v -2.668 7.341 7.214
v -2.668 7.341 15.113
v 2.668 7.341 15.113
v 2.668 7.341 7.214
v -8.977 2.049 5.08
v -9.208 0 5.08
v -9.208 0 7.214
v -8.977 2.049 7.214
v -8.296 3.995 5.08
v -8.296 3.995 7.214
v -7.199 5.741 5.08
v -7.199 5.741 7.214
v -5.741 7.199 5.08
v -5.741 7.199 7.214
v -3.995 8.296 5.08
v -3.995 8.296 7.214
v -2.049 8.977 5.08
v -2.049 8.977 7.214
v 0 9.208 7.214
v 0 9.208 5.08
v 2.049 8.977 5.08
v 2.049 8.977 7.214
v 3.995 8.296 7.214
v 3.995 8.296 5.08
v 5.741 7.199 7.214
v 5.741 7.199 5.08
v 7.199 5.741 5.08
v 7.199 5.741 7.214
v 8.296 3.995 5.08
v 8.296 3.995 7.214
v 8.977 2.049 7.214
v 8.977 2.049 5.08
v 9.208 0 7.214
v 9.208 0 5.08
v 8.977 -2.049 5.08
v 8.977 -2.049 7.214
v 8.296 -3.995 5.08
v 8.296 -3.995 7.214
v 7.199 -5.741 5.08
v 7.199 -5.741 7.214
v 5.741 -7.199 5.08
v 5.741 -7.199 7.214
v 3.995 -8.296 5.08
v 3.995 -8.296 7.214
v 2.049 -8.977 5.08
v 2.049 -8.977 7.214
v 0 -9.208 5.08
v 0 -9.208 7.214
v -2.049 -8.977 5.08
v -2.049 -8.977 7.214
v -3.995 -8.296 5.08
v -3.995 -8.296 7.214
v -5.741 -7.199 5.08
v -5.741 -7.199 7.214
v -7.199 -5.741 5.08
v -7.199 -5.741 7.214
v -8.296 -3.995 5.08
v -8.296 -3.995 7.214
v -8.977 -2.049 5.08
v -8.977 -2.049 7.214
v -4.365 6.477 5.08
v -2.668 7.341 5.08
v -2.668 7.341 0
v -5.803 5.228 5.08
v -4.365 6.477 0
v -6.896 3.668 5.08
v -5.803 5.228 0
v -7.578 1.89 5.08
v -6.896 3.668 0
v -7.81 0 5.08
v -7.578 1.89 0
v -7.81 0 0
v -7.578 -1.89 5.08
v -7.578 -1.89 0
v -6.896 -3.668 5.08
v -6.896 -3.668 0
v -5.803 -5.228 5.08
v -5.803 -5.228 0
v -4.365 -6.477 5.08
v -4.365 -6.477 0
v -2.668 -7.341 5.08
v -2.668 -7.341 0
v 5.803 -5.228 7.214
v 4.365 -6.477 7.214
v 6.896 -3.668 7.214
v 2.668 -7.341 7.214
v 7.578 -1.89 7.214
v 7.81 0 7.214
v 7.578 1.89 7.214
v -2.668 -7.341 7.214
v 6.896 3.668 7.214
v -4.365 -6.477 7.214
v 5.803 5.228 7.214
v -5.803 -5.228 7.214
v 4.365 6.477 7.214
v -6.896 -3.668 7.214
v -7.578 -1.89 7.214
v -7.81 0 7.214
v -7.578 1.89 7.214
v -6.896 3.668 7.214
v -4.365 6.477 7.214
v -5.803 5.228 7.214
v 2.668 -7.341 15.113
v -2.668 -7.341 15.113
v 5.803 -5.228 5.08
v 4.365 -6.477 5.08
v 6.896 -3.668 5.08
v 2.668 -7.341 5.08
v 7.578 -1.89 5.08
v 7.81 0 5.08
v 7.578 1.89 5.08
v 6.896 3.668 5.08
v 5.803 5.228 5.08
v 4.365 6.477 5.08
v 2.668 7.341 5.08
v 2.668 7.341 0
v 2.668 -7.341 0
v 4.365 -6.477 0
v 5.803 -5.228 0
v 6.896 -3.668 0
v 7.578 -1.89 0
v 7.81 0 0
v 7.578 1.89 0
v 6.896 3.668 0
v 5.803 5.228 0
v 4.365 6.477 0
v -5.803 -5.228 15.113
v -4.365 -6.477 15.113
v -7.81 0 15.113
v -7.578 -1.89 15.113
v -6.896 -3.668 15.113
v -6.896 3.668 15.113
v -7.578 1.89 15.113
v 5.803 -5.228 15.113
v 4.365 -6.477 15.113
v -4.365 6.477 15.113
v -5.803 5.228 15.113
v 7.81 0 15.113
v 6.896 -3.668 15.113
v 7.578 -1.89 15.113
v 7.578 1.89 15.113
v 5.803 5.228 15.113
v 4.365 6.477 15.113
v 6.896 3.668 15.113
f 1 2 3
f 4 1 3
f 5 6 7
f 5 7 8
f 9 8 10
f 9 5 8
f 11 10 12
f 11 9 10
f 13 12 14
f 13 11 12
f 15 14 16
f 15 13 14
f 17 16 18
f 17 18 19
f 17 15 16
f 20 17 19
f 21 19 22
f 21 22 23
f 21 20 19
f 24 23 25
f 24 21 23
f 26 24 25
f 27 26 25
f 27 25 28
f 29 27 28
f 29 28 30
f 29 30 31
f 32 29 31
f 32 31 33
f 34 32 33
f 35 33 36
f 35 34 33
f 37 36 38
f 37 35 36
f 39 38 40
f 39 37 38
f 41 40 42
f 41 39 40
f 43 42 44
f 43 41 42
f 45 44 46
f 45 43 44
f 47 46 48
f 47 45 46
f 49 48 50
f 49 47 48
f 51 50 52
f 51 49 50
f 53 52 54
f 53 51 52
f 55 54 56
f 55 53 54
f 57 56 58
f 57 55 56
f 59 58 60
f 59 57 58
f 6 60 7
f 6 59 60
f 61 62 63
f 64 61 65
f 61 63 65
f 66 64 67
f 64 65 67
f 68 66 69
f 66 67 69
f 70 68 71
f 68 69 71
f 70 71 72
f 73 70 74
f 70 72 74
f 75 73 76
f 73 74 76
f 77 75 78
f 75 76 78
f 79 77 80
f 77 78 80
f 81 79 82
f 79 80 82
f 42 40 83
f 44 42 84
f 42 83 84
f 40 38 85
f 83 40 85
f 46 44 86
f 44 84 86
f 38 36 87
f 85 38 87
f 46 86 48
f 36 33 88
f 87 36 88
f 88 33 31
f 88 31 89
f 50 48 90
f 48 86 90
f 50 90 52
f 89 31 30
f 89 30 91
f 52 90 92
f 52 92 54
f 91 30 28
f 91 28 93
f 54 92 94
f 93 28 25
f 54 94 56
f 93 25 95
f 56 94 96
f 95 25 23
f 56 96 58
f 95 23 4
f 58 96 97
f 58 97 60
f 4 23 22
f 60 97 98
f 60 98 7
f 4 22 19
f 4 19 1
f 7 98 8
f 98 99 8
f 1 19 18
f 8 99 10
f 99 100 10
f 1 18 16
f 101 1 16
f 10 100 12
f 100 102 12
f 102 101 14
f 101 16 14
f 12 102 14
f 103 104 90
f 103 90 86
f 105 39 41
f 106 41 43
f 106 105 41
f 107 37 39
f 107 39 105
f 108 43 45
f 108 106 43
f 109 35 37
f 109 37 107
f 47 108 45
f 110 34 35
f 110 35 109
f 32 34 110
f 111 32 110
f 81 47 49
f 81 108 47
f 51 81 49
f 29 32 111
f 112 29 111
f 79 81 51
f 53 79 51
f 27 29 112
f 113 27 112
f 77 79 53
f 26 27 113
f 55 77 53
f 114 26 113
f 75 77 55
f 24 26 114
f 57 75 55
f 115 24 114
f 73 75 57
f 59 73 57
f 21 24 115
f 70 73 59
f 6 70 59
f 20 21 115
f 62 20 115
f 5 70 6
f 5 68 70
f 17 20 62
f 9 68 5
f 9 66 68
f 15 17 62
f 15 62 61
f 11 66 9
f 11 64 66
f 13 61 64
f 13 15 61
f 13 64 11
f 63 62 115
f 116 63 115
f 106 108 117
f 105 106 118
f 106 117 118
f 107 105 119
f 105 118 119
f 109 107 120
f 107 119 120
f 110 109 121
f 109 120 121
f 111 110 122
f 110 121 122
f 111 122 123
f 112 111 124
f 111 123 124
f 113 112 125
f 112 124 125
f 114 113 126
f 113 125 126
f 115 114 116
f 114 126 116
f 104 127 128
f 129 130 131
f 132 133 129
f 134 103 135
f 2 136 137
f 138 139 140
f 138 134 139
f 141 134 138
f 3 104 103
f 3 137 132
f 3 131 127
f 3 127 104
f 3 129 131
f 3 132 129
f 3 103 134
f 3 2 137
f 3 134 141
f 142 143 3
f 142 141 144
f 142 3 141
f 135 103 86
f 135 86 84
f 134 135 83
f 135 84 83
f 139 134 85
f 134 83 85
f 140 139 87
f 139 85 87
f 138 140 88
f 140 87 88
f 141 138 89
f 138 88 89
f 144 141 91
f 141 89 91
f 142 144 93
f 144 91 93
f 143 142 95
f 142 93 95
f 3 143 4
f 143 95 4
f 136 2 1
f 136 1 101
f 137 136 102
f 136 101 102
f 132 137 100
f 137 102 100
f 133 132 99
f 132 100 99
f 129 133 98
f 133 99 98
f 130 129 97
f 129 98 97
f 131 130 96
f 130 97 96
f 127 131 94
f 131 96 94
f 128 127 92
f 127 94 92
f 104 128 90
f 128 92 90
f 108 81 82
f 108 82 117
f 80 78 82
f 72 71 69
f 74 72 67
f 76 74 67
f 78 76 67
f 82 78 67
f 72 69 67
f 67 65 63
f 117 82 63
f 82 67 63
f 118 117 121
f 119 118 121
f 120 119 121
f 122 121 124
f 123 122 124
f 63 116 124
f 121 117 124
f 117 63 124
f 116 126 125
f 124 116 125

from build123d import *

# Parameters (mm, degrees)
SKETCH1_R           = 7.8105
BOSS_EXTRUDE1_DEPTH = 15.113
SKETCH2_W           = 14.883103562
SKETCH2_H           = 1.269889382
CUT_EXTRUDE1_DEPTH  = 19.719257183
BOSS_EXTRUDE2_START = -5.08
SKETCH3_R           = 9.2075
BOSS_EXTRUDE2_DEPTH = 2.1336


with BuildPart() as part:
    # Sketch1 → Boss-Extrude1 (new body)
    with BuildSketch(Plane.XY):
        Circle(SKETCH1_R)
    extrude(amount=BOSS_EXTRUDE1_DEPTH)

    # Sketch2 → Cut-Extrude1 (cut, through all)
    with BuildSketch(Plane.XY.offset(15.113)):
        with Locations((0, 7.975544691)):
            Rectangle(SKETCH2_W, SKETCH2_H)
        with Locations((0, -7.975544691)):
            Rectangle(SKETCH2_W, SKETCH2_H)
    extrude(amount=-CUT_EXTRUDE1_DEPTH, mode=Mode.SUBTRACT)

    # Sketch3 → Boss-Extrude2 (add)
    with BuildSketch(Plane(origin=(0, 0, 0), x_dir=(-1, 0, 0), z_dir=(0, 0, -1)).offset(BOSS_EXTRUDE2_START)):
        Circle(SKETCH3_R)
    extrude(amount=-BOSS_EXTRUDE2_DEPTH)


solid = part.part
